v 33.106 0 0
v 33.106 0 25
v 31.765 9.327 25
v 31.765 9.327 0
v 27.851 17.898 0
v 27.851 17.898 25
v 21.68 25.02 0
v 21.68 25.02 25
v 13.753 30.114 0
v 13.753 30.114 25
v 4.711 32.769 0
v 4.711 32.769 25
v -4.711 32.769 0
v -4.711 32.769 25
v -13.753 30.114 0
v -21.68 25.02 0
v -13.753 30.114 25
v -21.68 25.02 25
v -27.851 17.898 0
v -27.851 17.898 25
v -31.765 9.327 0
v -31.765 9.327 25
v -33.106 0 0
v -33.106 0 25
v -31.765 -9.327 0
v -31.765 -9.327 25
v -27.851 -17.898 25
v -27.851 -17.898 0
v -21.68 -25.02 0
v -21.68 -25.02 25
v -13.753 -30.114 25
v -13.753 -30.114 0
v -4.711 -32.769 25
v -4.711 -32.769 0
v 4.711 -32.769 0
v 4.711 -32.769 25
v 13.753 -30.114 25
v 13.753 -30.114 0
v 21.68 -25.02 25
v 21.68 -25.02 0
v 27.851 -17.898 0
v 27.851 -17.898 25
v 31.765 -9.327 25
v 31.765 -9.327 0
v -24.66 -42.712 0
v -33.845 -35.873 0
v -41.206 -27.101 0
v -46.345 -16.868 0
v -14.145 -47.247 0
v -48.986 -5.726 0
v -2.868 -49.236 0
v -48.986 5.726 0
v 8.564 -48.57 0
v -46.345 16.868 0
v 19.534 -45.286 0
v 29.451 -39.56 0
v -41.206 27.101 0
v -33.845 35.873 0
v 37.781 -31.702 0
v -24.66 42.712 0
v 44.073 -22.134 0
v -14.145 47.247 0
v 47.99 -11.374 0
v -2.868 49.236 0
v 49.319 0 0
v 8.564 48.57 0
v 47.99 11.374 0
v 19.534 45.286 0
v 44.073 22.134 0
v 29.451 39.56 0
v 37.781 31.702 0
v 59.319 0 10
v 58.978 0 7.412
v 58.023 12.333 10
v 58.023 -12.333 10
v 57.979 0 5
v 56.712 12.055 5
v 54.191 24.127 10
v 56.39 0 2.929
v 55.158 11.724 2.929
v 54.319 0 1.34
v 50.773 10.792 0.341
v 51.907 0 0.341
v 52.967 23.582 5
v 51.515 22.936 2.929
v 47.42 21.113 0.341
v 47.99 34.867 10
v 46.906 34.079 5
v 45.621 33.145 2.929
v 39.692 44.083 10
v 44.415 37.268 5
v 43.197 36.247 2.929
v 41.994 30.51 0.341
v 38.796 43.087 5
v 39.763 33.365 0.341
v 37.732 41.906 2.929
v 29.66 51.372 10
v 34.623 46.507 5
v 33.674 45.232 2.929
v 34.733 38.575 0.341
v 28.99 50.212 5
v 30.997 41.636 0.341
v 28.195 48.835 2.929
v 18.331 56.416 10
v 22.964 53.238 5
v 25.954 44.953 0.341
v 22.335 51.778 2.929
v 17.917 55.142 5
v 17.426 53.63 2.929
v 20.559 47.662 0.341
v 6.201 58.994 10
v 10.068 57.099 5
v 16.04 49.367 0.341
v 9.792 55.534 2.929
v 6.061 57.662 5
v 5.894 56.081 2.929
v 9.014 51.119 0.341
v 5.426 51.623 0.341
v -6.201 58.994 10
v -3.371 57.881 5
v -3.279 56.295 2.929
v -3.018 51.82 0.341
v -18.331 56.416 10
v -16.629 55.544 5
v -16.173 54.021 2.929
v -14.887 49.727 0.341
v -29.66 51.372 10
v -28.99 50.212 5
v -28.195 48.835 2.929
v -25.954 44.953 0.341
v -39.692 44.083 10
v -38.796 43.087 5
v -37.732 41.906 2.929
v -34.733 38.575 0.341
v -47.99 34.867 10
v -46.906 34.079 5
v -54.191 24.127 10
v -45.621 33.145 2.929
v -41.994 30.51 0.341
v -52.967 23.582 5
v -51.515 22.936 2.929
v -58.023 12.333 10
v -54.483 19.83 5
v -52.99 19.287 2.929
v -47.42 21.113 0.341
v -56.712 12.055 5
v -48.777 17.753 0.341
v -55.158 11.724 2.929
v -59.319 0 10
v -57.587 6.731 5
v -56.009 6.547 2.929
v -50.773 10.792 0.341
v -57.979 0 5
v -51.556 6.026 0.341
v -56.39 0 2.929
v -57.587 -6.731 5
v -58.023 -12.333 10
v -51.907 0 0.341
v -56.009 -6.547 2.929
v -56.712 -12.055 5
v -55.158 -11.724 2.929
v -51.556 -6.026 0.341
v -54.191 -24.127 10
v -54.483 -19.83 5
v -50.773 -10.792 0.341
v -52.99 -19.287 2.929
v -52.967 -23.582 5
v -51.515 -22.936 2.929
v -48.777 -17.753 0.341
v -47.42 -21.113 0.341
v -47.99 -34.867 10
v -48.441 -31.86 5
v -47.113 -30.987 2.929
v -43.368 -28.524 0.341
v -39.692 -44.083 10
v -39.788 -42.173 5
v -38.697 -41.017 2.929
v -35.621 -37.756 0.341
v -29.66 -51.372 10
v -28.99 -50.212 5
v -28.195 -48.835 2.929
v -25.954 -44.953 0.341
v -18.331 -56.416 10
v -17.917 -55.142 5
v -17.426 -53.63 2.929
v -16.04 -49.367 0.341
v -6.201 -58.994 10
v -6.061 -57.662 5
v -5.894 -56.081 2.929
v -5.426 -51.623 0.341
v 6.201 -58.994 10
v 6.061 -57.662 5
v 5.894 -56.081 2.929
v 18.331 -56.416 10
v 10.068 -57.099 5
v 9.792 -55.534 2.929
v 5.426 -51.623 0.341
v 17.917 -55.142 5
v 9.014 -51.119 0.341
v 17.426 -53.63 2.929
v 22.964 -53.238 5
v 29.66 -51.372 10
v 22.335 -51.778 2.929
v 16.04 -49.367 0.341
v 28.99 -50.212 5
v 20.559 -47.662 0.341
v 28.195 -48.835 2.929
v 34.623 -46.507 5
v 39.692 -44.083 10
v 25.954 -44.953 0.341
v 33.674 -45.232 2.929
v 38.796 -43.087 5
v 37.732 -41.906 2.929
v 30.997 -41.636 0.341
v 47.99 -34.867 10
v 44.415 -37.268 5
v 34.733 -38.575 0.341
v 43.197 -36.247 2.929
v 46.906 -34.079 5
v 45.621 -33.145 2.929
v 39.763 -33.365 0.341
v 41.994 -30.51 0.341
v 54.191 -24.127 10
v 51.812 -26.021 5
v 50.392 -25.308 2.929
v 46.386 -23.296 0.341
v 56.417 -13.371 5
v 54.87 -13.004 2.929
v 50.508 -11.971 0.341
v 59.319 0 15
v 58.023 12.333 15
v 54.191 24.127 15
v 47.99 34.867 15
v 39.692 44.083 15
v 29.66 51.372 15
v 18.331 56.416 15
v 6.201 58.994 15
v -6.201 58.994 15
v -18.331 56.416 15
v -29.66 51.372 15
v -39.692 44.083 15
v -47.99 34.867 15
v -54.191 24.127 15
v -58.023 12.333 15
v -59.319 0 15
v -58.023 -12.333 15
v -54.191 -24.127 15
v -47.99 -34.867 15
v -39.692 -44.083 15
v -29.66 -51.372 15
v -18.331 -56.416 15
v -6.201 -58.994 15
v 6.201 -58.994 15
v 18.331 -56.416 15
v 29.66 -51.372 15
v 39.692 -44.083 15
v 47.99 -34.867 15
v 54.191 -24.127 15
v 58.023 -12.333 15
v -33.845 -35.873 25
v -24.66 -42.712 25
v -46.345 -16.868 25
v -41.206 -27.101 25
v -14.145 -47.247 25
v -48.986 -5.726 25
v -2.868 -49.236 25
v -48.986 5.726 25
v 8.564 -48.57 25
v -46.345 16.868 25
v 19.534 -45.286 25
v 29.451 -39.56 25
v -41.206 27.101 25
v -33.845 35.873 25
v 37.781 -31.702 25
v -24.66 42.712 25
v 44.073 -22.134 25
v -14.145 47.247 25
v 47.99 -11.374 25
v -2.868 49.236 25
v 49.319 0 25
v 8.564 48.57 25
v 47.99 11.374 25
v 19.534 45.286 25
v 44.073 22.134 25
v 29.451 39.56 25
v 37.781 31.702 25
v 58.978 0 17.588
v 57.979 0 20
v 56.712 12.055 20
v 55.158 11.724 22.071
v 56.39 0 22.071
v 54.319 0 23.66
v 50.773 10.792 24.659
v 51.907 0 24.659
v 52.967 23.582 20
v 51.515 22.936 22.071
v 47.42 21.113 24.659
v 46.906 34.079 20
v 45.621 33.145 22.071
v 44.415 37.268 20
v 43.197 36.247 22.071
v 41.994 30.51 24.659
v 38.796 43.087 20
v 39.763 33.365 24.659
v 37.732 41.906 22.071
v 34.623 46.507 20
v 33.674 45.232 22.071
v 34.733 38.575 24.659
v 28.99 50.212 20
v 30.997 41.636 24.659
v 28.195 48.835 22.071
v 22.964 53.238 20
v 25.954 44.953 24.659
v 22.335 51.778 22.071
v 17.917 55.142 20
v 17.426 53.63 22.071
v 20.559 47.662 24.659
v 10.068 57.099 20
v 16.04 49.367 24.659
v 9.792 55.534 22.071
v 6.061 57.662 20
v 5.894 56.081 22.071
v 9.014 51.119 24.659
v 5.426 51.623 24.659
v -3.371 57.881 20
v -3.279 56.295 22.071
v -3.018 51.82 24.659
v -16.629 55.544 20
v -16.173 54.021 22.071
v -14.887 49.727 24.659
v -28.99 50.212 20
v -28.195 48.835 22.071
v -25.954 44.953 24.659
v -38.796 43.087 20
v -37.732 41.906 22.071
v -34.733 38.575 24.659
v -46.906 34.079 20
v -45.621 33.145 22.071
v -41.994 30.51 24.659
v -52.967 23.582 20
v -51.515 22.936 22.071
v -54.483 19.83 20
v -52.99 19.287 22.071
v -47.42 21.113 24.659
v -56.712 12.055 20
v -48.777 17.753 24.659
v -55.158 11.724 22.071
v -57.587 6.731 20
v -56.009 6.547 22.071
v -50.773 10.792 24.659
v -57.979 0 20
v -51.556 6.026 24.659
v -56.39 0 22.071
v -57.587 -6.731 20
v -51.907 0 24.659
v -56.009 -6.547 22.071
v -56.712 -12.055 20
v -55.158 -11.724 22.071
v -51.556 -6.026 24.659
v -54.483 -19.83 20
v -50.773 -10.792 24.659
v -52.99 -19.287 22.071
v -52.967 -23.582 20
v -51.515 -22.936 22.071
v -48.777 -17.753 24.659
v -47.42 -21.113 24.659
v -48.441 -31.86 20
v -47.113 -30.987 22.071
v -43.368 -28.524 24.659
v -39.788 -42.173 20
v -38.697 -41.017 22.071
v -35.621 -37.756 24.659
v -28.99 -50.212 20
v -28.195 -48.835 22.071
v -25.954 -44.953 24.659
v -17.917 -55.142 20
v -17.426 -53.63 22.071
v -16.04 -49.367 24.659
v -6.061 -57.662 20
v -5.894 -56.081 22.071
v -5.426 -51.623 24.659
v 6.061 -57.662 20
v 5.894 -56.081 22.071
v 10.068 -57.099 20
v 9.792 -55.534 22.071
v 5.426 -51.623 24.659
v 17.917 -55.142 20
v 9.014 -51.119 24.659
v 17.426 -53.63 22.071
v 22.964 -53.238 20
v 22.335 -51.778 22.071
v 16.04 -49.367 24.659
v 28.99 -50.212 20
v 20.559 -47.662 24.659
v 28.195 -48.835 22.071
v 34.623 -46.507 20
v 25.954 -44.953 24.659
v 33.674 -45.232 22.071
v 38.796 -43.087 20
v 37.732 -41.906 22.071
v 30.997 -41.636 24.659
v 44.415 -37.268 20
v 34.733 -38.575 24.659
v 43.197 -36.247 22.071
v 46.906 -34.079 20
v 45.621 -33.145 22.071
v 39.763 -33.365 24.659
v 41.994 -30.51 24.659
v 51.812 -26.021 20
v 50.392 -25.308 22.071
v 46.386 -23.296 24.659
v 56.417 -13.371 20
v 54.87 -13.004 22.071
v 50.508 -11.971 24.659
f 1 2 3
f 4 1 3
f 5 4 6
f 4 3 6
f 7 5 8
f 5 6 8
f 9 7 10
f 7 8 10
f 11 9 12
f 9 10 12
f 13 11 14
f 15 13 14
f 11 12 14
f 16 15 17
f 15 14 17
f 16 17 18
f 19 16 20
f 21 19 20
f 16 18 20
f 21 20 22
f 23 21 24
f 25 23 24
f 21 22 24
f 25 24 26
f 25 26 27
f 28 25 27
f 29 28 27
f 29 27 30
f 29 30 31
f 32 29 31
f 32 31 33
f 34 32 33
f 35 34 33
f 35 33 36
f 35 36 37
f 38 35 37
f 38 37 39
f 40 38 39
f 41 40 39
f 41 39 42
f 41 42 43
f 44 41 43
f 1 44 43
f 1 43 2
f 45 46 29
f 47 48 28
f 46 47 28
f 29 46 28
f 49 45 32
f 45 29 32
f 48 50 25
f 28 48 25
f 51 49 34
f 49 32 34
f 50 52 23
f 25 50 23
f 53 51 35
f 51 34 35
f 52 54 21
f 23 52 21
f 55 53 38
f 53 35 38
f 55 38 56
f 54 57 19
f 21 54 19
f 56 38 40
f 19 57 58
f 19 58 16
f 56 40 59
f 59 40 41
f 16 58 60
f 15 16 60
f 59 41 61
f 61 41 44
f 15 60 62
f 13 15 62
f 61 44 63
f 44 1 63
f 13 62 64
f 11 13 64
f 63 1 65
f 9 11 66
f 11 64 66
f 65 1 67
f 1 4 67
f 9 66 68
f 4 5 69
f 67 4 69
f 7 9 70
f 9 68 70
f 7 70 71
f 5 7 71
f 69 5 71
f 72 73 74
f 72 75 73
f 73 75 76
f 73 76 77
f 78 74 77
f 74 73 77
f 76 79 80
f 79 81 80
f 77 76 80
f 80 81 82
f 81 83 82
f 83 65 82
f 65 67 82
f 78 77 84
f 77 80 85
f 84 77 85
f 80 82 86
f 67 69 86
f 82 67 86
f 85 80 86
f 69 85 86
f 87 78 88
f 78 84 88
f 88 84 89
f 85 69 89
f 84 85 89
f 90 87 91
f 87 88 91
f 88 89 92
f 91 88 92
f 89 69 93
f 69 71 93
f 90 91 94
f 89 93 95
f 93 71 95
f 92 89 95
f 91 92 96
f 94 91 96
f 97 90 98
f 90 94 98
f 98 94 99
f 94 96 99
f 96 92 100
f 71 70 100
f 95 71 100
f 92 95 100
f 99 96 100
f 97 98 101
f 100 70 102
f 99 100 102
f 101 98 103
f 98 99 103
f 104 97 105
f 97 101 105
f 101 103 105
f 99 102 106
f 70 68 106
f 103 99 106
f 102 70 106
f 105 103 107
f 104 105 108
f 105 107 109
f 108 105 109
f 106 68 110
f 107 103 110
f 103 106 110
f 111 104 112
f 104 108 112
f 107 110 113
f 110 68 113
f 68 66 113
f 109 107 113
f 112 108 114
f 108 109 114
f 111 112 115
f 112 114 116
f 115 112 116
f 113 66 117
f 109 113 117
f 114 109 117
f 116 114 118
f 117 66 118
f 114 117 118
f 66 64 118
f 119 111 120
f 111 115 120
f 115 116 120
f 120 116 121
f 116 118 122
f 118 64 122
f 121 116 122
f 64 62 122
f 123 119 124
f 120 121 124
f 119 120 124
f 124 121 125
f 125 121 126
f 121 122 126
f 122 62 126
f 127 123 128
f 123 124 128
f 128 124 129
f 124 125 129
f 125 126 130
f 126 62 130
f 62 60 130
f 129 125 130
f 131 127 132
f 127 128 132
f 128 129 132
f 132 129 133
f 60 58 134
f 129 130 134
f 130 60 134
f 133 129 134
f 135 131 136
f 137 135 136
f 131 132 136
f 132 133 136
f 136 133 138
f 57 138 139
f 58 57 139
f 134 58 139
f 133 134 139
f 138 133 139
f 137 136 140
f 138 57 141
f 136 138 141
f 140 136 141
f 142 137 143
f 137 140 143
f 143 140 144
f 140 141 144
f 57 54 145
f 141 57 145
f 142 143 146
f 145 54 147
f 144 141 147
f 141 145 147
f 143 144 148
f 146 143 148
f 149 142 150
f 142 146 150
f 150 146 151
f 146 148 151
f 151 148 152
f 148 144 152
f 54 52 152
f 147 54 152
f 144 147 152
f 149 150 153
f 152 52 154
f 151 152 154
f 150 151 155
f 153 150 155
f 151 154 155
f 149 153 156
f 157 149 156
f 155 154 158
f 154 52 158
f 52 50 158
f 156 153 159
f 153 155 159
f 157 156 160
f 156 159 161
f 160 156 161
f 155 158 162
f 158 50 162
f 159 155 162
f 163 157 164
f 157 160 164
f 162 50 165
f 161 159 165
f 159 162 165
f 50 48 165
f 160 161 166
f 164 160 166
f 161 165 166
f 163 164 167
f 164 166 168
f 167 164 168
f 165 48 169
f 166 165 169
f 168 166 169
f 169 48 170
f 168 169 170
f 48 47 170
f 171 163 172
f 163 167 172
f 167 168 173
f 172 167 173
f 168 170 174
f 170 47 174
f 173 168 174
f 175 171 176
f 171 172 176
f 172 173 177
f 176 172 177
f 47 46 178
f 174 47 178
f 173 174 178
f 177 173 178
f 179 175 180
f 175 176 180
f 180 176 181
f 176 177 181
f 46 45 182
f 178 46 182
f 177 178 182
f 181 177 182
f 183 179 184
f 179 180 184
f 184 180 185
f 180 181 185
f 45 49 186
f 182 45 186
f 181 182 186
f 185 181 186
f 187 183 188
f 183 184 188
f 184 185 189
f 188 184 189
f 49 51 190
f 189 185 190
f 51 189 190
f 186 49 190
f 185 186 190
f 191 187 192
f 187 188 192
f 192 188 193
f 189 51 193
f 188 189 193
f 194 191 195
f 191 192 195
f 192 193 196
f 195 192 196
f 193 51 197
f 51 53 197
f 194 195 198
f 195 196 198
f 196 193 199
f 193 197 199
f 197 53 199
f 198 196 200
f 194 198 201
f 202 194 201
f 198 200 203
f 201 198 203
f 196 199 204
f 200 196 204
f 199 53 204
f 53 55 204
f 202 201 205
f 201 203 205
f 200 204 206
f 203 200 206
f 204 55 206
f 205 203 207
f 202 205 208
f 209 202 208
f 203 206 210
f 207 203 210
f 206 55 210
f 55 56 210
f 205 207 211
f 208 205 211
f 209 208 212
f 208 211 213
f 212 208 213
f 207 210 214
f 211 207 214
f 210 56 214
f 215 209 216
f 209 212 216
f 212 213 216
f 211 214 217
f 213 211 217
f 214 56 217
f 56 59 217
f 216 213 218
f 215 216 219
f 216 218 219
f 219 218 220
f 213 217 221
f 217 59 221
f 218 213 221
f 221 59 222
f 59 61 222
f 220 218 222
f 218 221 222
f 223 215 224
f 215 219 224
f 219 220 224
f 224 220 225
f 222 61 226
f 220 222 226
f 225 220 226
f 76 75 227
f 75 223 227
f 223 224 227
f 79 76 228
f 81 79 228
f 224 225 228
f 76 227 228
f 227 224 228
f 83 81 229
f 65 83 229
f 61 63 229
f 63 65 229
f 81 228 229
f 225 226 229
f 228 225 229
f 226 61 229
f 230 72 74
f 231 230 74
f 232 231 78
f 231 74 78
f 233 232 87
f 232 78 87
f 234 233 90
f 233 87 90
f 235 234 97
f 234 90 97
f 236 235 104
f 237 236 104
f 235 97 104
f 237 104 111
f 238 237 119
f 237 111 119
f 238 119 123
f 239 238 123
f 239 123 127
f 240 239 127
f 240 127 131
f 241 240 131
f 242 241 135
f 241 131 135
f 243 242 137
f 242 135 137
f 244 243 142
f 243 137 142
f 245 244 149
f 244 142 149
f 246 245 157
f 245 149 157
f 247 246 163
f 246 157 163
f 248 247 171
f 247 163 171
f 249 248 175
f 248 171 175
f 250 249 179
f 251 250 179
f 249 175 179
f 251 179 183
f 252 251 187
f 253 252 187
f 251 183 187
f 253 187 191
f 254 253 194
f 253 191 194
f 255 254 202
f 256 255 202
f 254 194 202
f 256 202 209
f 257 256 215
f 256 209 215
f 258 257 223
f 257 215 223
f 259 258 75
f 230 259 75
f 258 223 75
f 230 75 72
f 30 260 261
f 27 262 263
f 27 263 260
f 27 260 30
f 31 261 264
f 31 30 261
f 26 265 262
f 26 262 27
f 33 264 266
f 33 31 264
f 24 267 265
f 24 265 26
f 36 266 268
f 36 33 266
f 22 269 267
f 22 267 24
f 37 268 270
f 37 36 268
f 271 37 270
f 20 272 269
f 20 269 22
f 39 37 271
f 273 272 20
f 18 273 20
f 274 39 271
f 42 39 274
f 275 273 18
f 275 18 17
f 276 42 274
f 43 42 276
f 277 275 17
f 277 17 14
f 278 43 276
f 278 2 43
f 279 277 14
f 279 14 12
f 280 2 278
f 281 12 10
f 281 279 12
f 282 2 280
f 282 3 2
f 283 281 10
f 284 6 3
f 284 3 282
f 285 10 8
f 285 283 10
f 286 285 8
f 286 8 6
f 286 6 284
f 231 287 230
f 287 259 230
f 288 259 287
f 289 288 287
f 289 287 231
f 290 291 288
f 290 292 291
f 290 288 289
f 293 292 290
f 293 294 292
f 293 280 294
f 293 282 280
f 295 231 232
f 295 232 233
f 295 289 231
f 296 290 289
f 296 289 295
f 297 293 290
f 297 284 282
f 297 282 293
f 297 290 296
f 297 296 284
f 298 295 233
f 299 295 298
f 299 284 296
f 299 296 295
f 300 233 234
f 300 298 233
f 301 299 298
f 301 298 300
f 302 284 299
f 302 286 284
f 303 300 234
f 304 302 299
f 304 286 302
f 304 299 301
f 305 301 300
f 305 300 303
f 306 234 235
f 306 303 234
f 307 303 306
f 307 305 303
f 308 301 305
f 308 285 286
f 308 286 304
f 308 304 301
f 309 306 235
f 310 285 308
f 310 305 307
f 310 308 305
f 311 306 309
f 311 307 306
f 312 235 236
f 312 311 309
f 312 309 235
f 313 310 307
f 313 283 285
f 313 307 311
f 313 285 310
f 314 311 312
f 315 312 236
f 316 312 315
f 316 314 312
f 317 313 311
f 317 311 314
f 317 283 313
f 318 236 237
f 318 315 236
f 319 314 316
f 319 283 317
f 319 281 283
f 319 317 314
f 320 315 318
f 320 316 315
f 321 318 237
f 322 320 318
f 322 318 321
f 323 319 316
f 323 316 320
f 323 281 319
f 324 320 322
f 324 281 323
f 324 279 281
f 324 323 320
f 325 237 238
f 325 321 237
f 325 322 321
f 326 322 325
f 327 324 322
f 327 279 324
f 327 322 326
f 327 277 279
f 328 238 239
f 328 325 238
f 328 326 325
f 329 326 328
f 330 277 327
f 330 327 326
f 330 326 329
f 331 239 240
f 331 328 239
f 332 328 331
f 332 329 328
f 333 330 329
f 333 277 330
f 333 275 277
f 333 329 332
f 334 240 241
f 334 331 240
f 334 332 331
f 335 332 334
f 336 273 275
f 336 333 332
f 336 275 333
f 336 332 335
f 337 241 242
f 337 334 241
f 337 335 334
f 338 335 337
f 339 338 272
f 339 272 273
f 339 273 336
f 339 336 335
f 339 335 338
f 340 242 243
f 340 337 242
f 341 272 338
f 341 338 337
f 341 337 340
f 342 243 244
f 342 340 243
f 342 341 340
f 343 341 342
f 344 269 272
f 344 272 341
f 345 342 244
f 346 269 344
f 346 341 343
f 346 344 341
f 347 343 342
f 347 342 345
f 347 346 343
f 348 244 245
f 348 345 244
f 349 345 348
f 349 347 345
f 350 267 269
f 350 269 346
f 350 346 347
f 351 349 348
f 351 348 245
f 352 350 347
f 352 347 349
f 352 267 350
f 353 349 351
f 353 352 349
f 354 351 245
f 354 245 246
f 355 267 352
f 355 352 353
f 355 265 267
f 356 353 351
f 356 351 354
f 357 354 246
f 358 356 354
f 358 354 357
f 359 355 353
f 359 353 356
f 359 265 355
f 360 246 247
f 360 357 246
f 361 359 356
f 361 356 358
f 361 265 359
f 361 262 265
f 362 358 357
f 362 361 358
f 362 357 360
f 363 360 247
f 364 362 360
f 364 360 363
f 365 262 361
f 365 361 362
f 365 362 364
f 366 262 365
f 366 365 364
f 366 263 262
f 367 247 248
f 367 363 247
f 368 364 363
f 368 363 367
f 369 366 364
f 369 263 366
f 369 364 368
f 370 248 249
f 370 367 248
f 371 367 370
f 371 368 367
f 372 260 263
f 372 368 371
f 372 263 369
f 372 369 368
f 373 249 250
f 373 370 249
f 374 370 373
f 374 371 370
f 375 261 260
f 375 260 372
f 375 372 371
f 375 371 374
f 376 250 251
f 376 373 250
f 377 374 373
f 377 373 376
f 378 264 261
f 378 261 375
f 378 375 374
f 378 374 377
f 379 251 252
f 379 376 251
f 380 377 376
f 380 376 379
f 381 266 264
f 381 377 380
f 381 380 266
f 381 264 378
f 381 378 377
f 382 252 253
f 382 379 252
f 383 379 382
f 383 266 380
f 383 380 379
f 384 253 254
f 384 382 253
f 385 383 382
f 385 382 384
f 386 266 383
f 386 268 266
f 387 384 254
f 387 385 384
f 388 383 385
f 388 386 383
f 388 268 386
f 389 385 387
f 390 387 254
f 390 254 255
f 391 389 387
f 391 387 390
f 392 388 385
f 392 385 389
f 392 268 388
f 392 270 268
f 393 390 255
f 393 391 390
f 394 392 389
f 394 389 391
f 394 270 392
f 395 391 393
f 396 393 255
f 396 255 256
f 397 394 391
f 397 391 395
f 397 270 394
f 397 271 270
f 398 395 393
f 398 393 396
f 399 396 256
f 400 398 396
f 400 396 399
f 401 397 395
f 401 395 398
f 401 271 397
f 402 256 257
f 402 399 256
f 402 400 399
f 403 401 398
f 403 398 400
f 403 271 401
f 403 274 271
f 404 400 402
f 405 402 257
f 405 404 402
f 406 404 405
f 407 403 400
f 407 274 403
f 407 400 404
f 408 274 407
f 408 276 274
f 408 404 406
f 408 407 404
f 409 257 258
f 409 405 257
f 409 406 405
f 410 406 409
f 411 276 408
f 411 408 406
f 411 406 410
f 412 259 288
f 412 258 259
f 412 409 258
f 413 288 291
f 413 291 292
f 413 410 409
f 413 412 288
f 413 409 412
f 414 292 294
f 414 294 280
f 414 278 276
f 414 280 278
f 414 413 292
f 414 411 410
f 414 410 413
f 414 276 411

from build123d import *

# Parameters (mm, degrees)
F0_R     = 59.319188
F1_DEPTH = 25
F3_R     = 33.106016
F4_DEPTH = 116.983913
F5_R     = 10


with BuildPart() as f1:
    # F0 (on Top) → F1 (new body)
    with BuildSketch(Plane.XY):
        Circle(F0_R)
    extrude(amount=F1_DEPTH)

    # F3 (on offset) → F4 (cut)
    with BuildSketch(Plane.XY.offset(50)):
        Circle(F3_R)
    extrude(amount=-F4_DEPTH, mode=Mode.SUBTRACT)

    # F5
    f5_edges = [f1.edges().sort_by_distance(p)[0] for p in [
        (-59.319188, 0, 0),
        (-59.319188, 0, 25),
    ]]
    fillet(f5_edges, radius=F5_R)


solid = f1.part
